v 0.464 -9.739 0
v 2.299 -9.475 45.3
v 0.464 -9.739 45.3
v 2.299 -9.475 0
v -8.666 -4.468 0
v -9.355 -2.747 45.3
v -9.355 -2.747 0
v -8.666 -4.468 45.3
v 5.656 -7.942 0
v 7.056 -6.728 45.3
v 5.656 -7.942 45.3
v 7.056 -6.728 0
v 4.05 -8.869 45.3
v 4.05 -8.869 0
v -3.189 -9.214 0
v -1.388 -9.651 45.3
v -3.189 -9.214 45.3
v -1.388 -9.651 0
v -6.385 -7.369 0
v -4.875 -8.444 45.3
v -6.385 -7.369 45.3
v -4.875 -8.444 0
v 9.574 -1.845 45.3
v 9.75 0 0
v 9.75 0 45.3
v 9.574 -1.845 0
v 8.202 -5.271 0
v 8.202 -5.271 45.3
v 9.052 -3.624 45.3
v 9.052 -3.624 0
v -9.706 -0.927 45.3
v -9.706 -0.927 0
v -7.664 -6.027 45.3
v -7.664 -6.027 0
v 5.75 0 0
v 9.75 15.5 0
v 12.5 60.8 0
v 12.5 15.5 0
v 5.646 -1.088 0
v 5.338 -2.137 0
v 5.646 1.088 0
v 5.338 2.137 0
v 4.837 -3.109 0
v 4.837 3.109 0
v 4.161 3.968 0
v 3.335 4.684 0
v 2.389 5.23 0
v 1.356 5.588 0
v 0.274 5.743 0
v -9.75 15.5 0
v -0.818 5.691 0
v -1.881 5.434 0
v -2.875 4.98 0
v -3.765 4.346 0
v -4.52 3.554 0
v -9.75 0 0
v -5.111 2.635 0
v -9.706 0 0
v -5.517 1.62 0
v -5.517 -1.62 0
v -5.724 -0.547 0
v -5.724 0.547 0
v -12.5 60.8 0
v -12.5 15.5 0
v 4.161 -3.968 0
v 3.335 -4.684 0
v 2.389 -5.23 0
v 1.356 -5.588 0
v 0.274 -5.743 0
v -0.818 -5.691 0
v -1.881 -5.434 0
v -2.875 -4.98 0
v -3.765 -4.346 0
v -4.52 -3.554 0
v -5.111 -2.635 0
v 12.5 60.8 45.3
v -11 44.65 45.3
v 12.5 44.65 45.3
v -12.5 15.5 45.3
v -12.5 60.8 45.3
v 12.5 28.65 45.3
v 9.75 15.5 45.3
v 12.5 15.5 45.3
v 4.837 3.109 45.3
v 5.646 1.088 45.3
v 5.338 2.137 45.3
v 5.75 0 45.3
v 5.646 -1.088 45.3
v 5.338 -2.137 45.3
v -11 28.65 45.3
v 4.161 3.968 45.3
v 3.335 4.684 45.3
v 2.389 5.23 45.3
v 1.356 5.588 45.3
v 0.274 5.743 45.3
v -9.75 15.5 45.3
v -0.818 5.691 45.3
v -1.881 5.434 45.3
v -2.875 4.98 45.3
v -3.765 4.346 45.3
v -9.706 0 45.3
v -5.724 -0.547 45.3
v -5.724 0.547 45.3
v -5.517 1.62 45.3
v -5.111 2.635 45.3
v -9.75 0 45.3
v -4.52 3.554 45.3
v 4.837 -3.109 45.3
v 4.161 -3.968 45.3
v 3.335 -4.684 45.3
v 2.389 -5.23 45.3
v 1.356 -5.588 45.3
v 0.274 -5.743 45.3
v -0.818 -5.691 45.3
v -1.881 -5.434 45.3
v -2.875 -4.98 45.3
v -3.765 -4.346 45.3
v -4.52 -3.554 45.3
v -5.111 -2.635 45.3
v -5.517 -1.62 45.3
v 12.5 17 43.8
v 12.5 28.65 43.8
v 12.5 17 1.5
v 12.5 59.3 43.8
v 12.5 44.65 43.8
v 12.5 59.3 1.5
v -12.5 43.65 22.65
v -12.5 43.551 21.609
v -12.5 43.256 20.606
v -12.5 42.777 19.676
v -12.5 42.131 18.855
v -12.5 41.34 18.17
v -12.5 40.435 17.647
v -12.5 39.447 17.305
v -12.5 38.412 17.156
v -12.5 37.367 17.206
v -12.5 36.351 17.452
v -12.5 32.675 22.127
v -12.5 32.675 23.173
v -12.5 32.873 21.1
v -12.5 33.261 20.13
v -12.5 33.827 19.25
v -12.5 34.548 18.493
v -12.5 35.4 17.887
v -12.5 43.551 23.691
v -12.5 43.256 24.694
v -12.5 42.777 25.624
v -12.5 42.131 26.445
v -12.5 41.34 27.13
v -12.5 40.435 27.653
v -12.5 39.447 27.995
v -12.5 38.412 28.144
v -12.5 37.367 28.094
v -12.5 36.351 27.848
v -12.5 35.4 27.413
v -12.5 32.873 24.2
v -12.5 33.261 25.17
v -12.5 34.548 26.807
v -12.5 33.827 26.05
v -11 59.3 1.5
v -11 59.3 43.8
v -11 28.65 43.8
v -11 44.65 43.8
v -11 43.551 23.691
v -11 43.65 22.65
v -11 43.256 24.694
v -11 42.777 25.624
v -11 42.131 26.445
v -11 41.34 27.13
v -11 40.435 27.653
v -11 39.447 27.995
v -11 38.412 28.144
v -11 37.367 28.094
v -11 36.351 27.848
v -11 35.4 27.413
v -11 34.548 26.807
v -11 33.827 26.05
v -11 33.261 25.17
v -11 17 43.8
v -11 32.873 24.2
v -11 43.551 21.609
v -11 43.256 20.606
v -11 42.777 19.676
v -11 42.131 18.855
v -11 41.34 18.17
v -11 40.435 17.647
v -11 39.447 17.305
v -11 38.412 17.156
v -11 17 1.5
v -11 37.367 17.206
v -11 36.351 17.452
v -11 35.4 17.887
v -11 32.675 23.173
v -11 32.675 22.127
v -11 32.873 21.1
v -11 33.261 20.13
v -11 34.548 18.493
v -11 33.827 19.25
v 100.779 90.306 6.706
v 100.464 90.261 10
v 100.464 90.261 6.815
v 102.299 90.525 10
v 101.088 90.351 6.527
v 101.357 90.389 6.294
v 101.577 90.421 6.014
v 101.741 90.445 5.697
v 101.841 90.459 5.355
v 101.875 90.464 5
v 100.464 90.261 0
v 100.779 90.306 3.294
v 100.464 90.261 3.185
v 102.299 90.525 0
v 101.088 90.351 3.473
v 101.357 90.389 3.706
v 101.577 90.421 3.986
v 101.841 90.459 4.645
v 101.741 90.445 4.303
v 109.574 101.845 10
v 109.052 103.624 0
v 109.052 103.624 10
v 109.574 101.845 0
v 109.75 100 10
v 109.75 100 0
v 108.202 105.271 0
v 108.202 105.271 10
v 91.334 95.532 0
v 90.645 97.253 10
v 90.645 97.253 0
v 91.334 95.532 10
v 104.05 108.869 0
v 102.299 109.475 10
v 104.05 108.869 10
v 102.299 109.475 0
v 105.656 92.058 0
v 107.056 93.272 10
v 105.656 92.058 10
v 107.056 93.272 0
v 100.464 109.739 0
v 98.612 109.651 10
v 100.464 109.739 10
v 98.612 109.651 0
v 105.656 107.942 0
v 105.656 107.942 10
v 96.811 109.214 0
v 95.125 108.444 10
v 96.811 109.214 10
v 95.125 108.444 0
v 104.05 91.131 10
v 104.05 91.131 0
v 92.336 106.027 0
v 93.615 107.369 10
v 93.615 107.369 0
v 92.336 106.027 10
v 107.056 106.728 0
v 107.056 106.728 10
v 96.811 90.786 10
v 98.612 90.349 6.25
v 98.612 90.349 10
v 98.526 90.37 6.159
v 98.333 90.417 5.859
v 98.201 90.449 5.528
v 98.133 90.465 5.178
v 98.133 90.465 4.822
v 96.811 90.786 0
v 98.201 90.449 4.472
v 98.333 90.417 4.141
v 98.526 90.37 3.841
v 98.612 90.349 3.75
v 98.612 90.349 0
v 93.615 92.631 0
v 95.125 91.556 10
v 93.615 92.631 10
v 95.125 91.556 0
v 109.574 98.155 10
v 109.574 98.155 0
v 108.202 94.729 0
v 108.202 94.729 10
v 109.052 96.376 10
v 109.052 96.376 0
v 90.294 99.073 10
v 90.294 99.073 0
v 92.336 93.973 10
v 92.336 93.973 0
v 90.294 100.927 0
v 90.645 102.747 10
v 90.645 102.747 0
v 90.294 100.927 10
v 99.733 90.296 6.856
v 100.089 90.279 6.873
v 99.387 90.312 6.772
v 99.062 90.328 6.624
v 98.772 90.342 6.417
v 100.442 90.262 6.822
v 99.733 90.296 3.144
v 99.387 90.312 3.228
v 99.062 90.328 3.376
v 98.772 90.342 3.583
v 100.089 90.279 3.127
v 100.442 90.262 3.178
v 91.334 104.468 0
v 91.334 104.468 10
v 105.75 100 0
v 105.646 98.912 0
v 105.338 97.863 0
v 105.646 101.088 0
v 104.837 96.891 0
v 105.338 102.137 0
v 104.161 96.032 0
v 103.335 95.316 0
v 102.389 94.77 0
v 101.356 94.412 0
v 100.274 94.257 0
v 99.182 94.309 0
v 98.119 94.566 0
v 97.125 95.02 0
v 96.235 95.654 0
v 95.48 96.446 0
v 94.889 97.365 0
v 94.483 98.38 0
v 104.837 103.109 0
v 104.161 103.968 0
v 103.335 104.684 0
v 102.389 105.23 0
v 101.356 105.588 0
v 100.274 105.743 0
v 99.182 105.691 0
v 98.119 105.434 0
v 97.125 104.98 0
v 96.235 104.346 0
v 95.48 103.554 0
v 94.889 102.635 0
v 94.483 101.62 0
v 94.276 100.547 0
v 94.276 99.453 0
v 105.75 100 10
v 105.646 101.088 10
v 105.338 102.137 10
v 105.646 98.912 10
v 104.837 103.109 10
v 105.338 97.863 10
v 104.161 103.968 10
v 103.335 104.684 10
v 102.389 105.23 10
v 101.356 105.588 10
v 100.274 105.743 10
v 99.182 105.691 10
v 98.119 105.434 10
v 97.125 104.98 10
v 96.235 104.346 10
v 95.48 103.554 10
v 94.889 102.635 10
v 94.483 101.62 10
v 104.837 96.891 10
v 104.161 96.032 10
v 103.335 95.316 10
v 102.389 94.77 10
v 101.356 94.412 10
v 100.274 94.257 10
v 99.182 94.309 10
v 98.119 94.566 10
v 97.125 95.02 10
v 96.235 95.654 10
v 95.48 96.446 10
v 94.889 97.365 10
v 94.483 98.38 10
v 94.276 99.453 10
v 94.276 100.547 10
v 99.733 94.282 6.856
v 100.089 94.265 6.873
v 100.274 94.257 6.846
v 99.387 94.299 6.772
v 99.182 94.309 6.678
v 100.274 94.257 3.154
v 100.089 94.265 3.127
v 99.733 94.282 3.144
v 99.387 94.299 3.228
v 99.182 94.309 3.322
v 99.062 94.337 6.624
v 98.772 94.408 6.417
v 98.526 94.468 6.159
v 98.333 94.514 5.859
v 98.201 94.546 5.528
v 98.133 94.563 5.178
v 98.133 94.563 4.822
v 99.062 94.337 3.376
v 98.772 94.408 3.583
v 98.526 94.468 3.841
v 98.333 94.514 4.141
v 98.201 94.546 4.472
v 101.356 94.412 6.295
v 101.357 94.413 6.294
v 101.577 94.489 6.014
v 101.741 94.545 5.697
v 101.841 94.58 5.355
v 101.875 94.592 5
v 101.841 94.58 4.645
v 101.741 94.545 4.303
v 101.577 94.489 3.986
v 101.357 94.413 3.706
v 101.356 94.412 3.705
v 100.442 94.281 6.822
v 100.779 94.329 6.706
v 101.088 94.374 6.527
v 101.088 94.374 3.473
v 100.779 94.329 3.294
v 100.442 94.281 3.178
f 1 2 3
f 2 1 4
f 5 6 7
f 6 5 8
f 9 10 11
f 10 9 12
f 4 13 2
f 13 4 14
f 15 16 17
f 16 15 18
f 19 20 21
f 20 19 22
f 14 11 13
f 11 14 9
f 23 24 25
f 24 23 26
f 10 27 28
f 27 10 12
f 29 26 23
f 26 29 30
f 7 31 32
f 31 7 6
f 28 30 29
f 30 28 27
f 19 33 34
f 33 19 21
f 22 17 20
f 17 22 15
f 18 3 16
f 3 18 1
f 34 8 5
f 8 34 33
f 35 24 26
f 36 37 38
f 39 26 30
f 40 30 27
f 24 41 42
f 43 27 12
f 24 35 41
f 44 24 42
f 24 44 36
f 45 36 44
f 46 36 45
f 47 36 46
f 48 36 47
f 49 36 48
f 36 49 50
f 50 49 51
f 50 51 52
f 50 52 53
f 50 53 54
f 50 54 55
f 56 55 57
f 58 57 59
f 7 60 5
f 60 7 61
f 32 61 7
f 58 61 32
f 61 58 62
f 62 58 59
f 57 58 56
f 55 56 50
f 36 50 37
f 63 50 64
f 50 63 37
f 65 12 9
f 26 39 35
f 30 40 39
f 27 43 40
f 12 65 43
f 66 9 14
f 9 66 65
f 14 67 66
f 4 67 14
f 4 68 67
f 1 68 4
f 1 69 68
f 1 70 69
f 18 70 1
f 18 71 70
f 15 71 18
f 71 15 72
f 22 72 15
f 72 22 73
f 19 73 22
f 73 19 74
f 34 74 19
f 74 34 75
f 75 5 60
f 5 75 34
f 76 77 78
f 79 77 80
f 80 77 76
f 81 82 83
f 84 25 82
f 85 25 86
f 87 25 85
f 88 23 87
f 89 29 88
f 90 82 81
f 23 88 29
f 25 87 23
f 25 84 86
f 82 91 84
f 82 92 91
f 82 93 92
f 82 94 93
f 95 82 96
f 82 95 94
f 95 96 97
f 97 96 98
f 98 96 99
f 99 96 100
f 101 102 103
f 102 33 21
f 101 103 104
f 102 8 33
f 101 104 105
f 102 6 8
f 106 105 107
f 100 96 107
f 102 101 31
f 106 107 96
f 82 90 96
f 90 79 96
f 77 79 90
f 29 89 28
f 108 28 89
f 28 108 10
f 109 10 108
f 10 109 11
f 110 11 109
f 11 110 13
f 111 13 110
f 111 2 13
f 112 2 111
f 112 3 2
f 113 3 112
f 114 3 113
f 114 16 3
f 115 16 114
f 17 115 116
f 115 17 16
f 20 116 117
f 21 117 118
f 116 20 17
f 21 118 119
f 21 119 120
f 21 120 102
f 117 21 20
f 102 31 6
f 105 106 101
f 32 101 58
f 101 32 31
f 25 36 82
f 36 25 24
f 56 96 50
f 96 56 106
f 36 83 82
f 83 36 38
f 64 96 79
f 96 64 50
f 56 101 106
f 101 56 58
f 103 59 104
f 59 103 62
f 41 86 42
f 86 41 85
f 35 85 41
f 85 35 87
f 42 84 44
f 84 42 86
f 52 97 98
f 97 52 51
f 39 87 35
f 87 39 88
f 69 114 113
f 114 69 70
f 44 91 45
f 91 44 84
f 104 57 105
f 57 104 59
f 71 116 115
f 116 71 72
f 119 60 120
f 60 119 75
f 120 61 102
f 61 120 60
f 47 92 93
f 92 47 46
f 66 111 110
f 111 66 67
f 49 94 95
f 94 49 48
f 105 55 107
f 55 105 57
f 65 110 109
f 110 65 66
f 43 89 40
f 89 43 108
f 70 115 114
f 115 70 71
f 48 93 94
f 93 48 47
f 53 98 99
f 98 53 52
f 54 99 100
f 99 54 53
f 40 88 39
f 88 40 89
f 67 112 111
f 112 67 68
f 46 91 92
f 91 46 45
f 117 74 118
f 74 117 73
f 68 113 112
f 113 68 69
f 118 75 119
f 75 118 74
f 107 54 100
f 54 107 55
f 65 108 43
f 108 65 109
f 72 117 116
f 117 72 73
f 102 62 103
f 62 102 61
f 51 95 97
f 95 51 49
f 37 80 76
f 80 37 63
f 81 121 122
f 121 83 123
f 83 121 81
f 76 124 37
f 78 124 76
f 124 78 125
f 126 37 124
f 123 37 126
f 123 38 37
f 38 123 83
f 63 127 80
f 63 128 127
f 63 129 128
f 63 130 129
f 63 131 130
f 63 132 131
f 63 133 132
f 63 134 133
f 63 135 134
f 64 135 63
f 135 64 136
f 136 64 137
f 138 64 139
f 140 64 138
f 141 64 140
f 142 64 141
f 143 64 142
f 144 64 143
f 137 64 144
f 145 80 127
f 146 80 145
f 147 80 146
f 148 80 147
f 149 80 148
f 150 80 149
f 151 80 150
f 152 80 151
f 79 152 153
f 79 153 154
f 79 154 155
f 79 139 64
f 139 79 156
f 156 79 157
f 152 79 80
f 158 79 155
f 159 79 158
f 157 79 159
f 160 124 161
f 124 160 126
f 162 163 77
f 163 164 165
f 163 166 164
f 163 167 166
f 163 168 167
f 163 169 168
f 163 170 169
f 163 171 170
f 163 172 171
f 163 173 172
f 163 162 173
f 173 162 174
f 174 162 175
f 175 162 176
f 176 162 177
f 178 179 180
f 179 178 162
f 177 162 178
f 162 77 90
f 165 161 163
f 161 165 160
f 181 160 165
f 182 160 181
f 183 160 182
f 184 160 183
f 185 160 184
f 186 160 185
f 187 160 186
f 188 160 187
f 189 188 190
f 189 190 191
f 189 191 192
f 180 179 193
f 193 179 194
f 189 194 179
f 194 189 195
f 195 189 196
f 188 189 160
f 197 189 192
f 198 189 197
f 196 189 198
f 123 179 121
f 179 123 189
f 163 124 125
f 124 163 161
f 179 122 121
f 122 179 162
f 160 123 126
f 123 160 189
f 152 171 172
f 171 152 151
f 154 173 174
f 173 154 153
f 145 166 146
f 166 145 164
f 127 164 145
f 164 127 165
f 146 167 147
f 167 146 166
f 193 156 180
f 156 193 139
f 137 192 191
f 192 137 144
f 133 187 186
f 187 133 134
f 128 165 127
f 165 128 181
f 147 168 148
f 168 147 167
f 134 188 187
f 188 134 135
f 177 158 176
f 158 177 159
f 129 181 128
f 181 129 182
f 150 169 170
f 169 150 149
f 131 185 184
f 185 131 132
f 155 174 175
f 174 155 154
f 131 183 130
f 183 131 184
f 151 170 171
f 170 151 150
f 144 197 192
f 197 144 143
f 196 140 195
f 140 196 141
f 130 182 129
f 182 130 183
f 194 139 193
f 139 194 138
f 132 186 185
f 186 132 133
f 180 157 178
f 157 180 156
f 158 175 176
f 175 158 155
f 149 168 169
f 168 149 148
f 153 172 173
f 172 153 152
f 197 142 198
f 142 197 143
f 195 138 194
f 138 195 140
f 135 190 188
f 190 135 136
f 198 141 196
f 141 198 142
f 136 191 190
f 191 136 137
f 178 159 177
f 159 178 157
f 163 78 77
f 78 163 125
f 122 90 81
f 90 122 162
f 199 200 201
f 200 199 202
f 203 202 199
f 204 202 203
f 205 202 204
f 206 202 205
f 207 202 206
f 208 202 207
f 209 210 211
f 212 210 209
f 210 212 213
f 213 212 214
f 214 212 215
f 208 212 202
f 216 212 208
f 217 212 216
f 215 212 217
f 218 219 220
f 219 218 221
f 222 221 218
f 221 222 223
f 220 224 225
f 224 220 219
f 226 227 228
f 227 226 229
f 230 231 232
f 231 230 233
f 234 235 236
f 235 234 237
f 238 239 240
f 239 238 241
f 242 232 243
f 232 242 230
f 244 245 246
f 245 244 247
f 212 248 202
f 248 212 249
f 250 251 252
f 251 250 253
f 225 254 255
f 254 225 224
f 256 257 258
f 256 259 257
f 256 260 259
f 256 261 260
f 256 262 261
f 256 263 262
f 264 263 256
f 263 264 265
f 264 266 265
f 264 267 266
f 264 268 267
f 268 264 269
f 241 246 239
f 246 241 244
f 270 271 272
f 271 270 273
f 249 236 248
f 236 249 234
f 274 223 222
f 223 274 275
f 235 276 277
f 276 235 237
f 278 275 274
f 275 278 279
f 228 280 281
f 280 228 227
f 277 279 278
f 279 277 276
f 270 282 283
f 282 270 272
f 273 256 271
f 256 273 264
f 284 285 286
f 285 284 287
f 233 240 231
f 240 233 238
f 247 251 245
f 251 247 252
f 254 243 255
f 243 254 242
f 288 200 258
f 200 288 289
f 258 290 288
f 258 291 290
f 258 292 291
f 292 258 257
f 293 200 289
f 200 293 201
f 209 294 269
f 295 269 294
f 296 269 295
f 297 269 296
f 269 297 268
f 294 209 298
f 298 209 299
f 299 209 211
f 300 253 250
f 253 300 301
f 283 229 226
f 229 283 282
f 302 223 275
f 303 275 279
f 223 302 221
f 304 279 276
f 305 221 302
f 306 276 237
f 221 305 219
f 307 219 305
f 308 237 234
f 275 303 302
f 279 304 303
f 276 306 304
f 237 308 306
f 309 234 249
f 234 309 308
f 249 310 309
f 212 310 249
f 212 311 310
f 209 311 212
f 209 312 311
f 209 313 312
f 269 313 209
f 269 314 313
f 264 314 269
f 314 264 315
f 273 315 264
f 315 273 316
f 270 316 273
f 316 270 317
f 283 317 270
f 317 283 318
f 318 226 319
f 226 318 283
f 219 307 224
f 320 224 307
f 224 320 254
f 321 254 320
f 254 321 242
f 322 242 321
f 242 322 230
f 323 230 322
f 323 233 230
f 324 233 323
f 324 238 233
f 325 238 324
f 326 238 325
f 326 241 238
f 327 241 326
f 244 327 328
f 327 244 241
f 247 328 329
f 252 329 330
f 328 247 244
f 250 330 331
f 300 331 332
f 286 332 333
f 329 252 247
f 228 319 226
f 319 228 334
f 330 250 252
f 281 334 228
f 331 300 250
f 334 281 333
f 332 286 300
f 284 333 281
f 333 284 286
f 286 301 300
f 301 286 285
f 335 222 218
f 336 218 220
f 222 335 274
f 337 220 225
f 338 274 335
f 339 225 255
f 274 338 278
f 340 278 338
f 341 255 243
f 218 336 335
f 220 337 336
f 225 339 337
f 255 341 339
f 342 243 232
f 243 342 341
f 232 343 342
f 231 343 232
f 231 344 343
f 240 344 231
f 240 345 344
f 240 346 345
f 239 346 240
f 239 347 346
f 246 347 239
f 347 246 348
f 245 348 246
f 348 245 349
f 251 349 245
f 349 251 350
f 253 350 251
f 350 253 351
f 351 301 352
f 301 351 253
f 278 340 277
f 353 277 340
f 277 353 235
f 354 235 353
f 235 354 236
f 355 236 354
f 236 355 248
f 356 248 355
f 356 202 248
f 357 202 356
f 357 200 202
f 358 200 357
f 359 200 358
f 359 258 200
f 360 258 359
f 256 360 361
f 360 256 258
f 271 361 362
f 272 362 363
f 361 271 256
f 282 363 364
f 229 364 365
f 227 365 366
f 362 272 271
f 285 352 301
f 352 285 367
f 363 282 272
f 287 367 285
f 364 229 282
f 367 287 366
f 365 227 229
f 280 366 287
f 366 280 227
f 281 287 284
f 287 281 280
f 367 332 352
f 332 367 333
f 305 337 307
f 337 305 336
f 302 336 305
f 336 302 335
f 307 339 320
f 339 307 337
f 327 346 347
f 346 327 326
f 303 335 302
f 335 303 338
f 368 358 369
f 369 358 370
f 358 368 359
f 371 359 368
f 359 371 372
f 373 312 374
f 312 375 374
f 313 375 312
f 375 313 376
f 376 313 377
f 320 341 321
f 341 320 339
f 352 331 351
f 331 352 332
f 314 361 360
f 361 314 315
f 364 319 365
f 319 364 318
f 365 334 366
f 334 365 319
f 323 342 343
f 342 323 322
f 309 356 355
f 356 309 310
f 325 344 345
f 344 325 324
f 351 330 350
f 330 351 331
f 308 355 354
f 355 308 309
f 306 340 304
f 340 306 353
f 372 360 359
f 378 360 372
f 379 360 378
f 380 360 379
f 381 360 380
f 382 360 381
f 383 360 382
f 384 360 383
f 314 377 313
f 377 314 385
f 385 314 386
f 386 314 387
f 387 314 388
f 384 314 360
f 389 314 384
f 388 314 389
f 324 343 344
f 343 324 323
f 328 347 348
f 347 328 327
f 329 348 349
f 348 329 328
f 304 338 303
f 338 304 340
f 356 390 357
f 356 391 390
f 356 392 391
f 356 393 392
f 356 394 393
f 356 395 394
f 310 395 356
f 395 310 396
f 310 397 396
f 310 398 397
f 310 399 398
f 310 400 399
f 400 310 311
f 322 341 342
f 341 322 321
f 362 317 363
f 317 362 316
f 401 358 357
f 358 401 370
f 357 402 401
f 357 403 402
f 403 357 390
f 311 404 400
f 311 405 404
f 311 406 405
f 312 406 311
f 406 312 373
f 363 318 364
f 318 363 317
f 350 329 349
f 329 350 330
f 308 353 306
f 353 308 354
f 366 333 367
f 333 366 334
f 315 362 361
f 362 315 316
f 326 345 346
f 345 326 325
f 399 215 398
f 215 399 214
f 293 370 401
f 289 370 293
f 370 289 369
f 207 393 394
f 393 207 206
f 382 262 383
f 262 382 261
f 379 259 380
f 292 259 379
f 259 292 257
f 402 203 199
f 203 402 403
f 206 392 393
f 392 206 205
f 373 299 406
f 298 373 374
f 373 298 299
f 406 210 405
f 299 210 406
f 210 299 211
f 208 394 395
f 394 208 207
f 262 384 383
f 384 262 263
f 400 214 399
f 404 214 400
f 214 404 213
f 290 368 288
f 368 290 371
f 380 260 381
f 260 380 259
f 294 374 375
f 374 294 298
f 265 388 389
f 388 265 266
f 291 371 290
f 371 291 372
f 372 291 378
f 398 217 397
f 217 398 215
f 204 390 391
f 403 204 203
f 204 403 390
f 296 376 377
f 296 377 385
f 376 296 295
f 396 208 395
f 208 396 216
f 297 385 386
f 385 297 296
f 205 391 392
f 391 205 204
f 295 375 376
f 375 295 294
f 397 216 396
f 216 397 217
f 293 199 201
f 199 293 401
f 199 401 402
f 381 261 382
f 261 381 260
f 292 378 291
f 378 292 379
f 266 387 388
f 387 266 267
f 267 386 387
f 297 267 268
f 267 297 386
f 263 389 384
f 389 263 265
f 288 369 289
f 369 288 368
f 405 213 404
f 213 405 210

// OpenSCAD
nema_17_size = 42.3;
hole_d = 11;
pin_hole = 16;

t = 1.5;
d = 25;

//PENCIL = 8;
PEN    = 11.5;

pencil_d = PEN;
pencil_hole_d = 3.75;
pencil_hole_l = 4;

module motor_mount() {
    rotate([90, 0, 90])
    difference() {
        cube([nema_17_size + 2*t, nema_17_size + 2*t, d]);
        translate([t, t, t])
            cube([nema_17_size, nema_17_size, d]);
        translate([nema_17_size/2 + t, nema_17_size/2 + t, 0])
            cylinder(h = d, d = hole_d, $fn = 33);
        translate([nema_17_size/2-pin_hole/2, 2*t, t])
            cube([pin_hole, nema_17_size, d]);
    }
}

module pencil_holder() {
    h = nema_17_size / 1 + t*2;
    tp = pencil_hole_l;
    difference() {
        union() {
            cylinder(h = h, d = pencil_d + 2 * tp, $fn = 33);
            translate([-(pencil_d + 2 * tp)/2, 0, 0])
            #cube([pencil_d + 2 * tp, pencil_d + tp, h]);
        }
        translate([0, 0, -tp])
        cylinder(h = nema_17_size + 2 * tp, d = pencil_d, $fn = 33);
        //translate([0, 0, h/2])
        //rotate([90, 0, 0])
        //cylinder(h = pencil_hole_l + pencil_d, d = pencil_hole_d, $fn = 33);
    }
}

module pencil_clip() {
    h = 10;
    tp = pencil_hole_l;
    difference() {
        union() {
            cylinder(h = h, d = pencil_d + 2 * tp, $fn = 33);
            //translate([-(pencil_d + 2 * tp)/2, 0, 0])
            //#cube([pencil_d + 2 * tp, pencil_d + tp, h]);
        }
        translate([0, 0, -tp])
        cylinder(h = nema_17_size + 2 * tp, d = pencil_d, $fn = 33);
        translate([0, 0, h/2])
        rotate([90, 0, 0])
        cylinder(h = pencil_hole_l + pencil_d, d = pencil_hole_d, $fn = 33);
    }
}

pencil_holder();
translate([-d/2, pencil_d + pencil_hole_l, 0])
motor_mount();

translate([100, 100, 0])
pencil_clip();
